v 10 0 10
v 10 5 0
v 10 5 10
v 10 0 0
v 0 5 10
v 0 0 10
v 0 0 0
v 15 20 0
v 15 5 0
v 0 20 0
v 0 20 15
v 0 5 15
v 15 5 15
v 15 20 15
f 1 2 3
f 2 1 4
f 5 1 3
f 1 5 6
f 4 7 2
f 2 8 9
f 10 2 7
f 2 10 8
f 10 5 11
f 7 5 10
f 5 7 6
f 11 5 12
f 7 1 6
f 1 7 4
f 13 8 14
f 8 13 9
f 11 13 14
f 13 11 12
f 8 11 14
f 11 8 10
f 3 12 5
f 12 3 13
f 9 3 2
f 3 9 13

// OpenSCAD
union() {
    cube([10,10,10], center=false);
    translate([0,5,0]) {
        cube([15,15,15], center=false);
    }
}
